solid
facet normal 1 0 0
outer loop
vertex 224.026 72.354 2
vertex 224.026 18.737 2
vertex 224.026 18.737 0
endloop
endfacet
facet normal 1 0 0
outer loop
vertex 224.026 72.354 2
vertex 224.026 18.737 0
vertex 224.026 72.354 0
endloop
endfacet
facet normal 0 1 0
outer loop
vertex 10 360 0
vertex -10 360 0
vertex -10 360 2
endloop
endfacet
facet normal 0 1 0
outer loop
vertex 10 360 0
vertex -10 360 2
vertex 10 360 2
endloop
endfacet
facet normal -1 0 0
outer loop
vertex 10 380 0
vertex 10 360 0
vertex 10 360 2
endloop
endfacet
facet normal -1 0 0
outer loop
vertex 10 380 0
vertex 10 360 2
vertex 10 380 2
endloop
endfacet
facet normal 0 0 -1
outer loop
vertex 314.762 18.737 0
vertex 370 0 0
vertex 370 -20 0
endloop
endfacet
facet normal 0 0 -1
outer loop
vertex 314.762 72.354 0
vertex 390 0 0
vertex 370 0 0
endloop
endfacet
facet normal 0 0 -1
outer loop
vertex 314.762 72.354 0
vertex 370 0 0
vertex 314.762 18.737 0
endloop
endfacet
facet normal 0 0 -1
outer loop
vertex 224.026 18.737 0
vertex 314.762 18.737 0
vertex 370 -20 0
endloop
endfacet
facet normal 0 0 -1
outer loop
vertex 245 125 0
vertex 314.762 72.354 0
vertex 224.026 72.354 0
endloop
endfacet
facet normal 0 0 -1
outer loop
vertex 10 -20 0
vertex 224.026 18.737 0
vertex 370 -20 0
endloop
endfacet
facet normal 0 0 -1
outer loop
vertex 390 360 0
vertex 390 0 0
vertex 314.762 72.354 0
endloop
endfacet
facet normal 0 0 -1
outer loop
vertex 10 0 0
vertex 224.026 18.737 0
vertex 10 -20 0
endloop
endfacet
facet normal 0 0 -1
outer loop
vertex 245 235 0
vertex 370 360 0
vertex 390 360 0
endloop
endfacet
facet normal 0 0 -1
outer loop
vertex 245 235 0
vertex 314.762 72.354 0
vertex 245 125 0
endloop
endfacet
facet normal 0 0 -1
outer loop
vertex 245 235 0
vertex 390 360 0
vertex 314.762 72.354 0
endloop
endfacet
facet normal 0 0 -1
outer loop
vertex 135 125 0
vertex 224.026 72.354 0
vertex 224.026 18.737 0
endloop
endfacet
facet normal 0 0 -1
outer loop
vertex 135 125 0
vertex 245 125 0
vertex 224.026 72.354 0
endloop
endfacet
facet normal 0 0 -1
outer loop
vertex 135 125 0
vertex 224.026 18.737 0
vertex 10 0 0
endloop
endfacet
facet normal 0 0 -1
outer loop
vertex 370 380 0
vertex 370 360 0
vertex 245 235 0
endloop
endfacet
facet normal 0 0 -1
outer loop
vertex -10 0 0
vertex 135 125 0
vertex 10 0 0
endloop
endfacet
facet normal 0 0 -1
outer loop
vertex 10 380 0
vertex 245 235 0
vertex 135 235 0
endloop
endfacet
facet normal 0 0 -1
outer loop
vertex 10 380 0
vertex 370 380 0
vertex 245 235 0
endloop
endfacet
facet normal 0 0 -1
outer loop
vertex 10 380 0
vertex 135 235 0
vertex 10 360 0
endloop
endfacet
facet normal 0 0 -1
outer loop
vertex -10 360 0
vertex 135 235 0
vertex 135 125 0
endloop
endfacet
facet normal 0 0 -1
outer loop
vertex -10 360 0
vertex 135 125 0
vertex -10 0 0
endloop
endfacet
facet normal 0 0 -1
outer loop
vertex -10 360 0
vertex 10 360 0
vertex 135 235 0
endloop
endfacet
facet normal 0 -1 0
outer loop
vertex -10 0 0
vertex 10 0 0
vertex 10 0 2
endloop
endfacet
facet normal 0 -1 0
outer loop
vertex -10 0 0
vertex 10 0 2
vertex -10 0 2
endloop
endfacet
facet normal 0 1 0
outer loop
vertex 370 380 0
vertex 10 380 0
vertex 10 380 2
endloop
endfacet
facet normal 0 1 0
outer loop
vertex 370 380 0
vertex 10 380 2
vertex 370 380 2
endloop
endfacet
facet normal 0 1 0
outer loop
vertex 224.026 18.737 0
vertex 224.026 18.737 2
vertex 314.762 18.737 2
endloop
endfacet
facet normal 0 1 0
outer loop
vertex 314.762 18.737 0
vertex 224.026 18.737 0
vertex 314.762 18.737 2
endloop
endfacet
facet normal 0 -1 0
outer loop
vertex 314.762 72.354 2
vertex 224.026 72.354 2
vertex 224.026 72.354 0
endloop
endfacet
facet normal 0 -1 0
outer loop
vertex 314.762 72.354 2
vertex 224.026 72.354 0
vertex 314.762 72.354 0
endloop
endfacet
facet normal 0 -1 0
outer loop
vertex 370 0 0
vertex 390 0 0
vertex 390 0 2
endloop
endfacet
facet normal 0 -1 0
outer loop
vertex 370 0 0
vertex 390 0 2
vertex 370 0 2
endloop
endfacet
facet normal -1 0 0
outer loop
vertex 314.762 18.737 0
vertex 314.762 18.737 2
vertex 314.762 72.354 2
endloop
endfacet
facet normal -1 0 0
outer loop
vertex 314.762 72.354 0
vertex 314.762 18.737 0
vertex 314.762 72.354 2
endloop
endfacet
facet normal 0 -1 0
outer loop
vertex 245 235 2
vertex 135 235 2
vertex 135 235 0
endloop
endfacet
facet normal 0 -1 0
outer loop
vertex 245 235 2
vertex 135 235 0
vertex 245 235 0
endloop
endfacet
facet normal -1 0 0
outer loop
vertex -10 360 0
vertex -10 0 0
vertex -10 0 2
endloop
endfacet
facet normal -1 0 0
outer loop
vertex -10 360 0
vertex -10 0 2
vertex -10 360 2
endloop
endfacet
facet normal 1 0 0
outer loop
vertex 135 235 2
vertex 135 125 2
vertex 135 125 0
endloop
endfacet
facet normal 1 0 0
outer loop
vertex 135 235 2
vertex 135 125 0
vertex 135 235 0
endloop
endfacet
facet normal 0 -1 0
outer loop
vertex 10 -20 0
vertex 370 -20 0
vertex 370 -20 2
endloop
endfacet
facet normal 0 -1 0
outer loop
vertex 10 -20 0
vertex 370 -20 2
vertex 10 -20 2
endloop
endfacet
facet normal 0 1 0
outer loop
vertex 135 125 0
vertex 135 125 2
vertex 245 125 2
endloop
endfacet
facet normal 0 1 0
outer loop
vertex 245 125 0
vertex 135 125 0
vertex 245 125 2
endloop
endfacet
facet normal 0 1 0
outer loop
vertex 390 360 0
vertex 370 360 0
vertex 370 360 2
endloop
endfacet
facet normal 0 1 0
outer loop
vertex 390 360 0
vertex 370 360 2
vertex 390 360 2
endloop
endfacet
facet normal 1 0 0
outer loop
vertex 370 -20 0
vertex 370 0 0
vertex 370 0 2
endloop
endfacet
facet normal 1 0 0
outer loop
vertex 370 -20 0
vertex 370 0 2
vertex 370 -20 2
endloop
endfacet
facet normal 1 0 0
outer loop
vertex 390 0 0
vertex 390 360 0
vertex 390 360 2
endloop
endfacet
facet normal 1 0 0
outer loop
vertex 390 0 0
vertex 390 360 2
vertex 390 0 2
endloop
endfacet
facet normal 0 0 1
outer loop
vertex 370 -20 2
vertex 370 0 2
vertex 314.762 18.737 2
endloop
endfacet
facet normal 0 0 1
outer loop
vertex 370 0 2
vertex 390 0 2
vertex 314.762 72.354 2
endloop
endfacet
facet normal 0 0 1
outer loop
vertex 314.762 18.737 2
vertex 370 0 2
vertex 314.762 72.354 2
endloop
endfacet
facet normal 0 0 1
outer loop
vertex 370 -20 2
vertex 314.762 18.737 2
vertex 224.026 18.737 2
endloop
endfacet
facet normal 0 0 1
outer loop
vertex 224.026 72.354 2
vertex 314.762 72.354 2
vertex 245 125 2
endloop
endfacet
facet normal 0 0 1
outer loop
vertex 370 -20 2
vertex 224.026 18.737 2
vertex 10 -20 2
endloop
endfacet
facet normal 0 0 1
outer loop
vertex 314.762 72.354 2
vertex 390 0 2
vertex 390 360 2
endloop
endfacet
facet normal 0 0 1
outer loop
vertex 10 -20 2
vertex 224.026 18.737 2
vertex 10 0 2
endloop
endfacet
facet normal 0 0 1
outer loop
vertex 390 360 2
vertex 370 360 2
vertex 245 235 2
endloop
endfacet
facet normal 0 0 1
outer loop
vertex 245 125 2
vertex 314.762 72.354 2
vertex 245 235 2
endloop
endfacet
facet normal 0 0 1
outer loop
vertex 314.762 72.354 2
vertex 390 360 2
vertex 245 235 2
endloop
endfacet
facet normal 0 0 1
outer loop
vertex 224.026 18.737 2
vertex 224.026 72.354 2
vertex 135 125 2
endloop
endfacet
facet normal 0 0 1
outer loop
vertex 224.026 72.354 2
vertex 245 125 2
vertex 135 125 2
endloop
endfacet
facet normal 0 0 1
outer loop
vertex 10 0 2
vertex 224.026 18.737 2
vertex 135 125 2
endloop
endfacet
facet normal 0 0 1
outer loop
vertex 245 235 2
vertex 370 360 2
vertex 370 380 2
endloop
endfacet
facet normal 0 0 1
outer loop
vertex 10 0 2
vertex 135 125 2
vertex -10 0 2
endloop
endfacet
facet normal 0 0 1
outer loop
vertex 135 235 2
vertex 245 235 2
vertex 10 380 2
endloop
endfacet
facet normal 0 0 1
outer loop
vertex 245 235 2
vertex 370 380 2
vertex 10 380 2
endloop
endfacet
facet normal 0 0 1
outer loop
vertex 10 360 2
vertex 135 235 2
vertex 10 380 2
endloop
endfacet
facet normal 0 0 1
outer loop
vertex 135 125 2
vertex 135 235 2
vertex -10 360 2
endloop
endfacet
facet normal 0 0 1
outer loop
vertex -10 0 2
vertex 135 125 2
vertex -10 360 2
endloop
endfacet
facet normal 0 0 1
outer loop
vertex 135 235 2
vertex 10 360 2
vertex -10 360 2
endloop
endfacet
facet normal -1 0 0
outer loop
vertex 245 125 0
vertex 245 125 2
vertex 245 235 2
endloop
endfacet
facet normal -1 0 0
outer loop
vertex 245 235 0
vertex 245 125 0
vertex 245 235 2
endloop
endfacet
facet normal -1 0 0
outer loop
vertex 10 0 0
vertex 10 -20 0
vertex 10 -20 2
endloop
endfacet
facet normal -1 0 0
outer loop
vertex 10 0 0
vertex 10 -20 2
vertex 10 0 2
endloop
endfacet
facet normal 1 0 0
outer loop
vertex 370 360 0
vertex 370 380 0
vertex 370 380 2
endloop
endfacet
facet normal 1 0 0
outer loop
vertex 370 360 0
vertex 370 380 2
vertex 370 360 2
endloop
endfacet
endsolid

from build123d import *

# Parameters (mm, degrees)
EXTRUDE_1_DEPTH     = 2
SKETCH_2_W          = 110
SKETCH_2_H          = 110
CUT_EXTRUDE_1_DEPTH = 2
SKETCH_3_W          = 90.735858575
SKETCH_3_H          = 53.616643703
CUT_EXTRUDE_2_DEPTH = 75


with BuildPart() as part:
    # 草图1 → 凸台-拉伸1 (new body)
    with BuildSketch(Plane.XY):
        Polygon((10.000000001, 380), (370.000000001, 380), (370.000000001, 360), (390.000000001, 360), (390.000000001, 0), (370.000000001, 0), (370.000000001, -20), (10.000000001, -20), (10.000000001, 0), (-9.999999999, 0), (-9.999999999, 360), (10.000000001, 360), align=None)
    extrude(amount=EXTRUDE_1_DEPTH)

    # 草图2 → 切除-拉伸1 (cut)
    with BuildSketch(Plane.XY.offset(2)):
        with Locations((189.999999924, 180)):
            Rectangle(SKETCH_2_W, SKETCH_2_H)
    extrude(amount=-CUT_EXTRUDE_1_DEPTH, mode=Mode.SUBTRACT)

    # 草图3 → 切除-拉伸2 (cut)
    with BuildSketch(Plane.XY.offset(2)):
        with Locations((269.393876178, 45.545798569)):
            Rectangle(SKETCH_3_W, SKETCH_3_H)
    extrude(amount=-CUT_EXTRUDE_2_DEPTH, mode=Mode.SUBTRACT)


solid = part.part
